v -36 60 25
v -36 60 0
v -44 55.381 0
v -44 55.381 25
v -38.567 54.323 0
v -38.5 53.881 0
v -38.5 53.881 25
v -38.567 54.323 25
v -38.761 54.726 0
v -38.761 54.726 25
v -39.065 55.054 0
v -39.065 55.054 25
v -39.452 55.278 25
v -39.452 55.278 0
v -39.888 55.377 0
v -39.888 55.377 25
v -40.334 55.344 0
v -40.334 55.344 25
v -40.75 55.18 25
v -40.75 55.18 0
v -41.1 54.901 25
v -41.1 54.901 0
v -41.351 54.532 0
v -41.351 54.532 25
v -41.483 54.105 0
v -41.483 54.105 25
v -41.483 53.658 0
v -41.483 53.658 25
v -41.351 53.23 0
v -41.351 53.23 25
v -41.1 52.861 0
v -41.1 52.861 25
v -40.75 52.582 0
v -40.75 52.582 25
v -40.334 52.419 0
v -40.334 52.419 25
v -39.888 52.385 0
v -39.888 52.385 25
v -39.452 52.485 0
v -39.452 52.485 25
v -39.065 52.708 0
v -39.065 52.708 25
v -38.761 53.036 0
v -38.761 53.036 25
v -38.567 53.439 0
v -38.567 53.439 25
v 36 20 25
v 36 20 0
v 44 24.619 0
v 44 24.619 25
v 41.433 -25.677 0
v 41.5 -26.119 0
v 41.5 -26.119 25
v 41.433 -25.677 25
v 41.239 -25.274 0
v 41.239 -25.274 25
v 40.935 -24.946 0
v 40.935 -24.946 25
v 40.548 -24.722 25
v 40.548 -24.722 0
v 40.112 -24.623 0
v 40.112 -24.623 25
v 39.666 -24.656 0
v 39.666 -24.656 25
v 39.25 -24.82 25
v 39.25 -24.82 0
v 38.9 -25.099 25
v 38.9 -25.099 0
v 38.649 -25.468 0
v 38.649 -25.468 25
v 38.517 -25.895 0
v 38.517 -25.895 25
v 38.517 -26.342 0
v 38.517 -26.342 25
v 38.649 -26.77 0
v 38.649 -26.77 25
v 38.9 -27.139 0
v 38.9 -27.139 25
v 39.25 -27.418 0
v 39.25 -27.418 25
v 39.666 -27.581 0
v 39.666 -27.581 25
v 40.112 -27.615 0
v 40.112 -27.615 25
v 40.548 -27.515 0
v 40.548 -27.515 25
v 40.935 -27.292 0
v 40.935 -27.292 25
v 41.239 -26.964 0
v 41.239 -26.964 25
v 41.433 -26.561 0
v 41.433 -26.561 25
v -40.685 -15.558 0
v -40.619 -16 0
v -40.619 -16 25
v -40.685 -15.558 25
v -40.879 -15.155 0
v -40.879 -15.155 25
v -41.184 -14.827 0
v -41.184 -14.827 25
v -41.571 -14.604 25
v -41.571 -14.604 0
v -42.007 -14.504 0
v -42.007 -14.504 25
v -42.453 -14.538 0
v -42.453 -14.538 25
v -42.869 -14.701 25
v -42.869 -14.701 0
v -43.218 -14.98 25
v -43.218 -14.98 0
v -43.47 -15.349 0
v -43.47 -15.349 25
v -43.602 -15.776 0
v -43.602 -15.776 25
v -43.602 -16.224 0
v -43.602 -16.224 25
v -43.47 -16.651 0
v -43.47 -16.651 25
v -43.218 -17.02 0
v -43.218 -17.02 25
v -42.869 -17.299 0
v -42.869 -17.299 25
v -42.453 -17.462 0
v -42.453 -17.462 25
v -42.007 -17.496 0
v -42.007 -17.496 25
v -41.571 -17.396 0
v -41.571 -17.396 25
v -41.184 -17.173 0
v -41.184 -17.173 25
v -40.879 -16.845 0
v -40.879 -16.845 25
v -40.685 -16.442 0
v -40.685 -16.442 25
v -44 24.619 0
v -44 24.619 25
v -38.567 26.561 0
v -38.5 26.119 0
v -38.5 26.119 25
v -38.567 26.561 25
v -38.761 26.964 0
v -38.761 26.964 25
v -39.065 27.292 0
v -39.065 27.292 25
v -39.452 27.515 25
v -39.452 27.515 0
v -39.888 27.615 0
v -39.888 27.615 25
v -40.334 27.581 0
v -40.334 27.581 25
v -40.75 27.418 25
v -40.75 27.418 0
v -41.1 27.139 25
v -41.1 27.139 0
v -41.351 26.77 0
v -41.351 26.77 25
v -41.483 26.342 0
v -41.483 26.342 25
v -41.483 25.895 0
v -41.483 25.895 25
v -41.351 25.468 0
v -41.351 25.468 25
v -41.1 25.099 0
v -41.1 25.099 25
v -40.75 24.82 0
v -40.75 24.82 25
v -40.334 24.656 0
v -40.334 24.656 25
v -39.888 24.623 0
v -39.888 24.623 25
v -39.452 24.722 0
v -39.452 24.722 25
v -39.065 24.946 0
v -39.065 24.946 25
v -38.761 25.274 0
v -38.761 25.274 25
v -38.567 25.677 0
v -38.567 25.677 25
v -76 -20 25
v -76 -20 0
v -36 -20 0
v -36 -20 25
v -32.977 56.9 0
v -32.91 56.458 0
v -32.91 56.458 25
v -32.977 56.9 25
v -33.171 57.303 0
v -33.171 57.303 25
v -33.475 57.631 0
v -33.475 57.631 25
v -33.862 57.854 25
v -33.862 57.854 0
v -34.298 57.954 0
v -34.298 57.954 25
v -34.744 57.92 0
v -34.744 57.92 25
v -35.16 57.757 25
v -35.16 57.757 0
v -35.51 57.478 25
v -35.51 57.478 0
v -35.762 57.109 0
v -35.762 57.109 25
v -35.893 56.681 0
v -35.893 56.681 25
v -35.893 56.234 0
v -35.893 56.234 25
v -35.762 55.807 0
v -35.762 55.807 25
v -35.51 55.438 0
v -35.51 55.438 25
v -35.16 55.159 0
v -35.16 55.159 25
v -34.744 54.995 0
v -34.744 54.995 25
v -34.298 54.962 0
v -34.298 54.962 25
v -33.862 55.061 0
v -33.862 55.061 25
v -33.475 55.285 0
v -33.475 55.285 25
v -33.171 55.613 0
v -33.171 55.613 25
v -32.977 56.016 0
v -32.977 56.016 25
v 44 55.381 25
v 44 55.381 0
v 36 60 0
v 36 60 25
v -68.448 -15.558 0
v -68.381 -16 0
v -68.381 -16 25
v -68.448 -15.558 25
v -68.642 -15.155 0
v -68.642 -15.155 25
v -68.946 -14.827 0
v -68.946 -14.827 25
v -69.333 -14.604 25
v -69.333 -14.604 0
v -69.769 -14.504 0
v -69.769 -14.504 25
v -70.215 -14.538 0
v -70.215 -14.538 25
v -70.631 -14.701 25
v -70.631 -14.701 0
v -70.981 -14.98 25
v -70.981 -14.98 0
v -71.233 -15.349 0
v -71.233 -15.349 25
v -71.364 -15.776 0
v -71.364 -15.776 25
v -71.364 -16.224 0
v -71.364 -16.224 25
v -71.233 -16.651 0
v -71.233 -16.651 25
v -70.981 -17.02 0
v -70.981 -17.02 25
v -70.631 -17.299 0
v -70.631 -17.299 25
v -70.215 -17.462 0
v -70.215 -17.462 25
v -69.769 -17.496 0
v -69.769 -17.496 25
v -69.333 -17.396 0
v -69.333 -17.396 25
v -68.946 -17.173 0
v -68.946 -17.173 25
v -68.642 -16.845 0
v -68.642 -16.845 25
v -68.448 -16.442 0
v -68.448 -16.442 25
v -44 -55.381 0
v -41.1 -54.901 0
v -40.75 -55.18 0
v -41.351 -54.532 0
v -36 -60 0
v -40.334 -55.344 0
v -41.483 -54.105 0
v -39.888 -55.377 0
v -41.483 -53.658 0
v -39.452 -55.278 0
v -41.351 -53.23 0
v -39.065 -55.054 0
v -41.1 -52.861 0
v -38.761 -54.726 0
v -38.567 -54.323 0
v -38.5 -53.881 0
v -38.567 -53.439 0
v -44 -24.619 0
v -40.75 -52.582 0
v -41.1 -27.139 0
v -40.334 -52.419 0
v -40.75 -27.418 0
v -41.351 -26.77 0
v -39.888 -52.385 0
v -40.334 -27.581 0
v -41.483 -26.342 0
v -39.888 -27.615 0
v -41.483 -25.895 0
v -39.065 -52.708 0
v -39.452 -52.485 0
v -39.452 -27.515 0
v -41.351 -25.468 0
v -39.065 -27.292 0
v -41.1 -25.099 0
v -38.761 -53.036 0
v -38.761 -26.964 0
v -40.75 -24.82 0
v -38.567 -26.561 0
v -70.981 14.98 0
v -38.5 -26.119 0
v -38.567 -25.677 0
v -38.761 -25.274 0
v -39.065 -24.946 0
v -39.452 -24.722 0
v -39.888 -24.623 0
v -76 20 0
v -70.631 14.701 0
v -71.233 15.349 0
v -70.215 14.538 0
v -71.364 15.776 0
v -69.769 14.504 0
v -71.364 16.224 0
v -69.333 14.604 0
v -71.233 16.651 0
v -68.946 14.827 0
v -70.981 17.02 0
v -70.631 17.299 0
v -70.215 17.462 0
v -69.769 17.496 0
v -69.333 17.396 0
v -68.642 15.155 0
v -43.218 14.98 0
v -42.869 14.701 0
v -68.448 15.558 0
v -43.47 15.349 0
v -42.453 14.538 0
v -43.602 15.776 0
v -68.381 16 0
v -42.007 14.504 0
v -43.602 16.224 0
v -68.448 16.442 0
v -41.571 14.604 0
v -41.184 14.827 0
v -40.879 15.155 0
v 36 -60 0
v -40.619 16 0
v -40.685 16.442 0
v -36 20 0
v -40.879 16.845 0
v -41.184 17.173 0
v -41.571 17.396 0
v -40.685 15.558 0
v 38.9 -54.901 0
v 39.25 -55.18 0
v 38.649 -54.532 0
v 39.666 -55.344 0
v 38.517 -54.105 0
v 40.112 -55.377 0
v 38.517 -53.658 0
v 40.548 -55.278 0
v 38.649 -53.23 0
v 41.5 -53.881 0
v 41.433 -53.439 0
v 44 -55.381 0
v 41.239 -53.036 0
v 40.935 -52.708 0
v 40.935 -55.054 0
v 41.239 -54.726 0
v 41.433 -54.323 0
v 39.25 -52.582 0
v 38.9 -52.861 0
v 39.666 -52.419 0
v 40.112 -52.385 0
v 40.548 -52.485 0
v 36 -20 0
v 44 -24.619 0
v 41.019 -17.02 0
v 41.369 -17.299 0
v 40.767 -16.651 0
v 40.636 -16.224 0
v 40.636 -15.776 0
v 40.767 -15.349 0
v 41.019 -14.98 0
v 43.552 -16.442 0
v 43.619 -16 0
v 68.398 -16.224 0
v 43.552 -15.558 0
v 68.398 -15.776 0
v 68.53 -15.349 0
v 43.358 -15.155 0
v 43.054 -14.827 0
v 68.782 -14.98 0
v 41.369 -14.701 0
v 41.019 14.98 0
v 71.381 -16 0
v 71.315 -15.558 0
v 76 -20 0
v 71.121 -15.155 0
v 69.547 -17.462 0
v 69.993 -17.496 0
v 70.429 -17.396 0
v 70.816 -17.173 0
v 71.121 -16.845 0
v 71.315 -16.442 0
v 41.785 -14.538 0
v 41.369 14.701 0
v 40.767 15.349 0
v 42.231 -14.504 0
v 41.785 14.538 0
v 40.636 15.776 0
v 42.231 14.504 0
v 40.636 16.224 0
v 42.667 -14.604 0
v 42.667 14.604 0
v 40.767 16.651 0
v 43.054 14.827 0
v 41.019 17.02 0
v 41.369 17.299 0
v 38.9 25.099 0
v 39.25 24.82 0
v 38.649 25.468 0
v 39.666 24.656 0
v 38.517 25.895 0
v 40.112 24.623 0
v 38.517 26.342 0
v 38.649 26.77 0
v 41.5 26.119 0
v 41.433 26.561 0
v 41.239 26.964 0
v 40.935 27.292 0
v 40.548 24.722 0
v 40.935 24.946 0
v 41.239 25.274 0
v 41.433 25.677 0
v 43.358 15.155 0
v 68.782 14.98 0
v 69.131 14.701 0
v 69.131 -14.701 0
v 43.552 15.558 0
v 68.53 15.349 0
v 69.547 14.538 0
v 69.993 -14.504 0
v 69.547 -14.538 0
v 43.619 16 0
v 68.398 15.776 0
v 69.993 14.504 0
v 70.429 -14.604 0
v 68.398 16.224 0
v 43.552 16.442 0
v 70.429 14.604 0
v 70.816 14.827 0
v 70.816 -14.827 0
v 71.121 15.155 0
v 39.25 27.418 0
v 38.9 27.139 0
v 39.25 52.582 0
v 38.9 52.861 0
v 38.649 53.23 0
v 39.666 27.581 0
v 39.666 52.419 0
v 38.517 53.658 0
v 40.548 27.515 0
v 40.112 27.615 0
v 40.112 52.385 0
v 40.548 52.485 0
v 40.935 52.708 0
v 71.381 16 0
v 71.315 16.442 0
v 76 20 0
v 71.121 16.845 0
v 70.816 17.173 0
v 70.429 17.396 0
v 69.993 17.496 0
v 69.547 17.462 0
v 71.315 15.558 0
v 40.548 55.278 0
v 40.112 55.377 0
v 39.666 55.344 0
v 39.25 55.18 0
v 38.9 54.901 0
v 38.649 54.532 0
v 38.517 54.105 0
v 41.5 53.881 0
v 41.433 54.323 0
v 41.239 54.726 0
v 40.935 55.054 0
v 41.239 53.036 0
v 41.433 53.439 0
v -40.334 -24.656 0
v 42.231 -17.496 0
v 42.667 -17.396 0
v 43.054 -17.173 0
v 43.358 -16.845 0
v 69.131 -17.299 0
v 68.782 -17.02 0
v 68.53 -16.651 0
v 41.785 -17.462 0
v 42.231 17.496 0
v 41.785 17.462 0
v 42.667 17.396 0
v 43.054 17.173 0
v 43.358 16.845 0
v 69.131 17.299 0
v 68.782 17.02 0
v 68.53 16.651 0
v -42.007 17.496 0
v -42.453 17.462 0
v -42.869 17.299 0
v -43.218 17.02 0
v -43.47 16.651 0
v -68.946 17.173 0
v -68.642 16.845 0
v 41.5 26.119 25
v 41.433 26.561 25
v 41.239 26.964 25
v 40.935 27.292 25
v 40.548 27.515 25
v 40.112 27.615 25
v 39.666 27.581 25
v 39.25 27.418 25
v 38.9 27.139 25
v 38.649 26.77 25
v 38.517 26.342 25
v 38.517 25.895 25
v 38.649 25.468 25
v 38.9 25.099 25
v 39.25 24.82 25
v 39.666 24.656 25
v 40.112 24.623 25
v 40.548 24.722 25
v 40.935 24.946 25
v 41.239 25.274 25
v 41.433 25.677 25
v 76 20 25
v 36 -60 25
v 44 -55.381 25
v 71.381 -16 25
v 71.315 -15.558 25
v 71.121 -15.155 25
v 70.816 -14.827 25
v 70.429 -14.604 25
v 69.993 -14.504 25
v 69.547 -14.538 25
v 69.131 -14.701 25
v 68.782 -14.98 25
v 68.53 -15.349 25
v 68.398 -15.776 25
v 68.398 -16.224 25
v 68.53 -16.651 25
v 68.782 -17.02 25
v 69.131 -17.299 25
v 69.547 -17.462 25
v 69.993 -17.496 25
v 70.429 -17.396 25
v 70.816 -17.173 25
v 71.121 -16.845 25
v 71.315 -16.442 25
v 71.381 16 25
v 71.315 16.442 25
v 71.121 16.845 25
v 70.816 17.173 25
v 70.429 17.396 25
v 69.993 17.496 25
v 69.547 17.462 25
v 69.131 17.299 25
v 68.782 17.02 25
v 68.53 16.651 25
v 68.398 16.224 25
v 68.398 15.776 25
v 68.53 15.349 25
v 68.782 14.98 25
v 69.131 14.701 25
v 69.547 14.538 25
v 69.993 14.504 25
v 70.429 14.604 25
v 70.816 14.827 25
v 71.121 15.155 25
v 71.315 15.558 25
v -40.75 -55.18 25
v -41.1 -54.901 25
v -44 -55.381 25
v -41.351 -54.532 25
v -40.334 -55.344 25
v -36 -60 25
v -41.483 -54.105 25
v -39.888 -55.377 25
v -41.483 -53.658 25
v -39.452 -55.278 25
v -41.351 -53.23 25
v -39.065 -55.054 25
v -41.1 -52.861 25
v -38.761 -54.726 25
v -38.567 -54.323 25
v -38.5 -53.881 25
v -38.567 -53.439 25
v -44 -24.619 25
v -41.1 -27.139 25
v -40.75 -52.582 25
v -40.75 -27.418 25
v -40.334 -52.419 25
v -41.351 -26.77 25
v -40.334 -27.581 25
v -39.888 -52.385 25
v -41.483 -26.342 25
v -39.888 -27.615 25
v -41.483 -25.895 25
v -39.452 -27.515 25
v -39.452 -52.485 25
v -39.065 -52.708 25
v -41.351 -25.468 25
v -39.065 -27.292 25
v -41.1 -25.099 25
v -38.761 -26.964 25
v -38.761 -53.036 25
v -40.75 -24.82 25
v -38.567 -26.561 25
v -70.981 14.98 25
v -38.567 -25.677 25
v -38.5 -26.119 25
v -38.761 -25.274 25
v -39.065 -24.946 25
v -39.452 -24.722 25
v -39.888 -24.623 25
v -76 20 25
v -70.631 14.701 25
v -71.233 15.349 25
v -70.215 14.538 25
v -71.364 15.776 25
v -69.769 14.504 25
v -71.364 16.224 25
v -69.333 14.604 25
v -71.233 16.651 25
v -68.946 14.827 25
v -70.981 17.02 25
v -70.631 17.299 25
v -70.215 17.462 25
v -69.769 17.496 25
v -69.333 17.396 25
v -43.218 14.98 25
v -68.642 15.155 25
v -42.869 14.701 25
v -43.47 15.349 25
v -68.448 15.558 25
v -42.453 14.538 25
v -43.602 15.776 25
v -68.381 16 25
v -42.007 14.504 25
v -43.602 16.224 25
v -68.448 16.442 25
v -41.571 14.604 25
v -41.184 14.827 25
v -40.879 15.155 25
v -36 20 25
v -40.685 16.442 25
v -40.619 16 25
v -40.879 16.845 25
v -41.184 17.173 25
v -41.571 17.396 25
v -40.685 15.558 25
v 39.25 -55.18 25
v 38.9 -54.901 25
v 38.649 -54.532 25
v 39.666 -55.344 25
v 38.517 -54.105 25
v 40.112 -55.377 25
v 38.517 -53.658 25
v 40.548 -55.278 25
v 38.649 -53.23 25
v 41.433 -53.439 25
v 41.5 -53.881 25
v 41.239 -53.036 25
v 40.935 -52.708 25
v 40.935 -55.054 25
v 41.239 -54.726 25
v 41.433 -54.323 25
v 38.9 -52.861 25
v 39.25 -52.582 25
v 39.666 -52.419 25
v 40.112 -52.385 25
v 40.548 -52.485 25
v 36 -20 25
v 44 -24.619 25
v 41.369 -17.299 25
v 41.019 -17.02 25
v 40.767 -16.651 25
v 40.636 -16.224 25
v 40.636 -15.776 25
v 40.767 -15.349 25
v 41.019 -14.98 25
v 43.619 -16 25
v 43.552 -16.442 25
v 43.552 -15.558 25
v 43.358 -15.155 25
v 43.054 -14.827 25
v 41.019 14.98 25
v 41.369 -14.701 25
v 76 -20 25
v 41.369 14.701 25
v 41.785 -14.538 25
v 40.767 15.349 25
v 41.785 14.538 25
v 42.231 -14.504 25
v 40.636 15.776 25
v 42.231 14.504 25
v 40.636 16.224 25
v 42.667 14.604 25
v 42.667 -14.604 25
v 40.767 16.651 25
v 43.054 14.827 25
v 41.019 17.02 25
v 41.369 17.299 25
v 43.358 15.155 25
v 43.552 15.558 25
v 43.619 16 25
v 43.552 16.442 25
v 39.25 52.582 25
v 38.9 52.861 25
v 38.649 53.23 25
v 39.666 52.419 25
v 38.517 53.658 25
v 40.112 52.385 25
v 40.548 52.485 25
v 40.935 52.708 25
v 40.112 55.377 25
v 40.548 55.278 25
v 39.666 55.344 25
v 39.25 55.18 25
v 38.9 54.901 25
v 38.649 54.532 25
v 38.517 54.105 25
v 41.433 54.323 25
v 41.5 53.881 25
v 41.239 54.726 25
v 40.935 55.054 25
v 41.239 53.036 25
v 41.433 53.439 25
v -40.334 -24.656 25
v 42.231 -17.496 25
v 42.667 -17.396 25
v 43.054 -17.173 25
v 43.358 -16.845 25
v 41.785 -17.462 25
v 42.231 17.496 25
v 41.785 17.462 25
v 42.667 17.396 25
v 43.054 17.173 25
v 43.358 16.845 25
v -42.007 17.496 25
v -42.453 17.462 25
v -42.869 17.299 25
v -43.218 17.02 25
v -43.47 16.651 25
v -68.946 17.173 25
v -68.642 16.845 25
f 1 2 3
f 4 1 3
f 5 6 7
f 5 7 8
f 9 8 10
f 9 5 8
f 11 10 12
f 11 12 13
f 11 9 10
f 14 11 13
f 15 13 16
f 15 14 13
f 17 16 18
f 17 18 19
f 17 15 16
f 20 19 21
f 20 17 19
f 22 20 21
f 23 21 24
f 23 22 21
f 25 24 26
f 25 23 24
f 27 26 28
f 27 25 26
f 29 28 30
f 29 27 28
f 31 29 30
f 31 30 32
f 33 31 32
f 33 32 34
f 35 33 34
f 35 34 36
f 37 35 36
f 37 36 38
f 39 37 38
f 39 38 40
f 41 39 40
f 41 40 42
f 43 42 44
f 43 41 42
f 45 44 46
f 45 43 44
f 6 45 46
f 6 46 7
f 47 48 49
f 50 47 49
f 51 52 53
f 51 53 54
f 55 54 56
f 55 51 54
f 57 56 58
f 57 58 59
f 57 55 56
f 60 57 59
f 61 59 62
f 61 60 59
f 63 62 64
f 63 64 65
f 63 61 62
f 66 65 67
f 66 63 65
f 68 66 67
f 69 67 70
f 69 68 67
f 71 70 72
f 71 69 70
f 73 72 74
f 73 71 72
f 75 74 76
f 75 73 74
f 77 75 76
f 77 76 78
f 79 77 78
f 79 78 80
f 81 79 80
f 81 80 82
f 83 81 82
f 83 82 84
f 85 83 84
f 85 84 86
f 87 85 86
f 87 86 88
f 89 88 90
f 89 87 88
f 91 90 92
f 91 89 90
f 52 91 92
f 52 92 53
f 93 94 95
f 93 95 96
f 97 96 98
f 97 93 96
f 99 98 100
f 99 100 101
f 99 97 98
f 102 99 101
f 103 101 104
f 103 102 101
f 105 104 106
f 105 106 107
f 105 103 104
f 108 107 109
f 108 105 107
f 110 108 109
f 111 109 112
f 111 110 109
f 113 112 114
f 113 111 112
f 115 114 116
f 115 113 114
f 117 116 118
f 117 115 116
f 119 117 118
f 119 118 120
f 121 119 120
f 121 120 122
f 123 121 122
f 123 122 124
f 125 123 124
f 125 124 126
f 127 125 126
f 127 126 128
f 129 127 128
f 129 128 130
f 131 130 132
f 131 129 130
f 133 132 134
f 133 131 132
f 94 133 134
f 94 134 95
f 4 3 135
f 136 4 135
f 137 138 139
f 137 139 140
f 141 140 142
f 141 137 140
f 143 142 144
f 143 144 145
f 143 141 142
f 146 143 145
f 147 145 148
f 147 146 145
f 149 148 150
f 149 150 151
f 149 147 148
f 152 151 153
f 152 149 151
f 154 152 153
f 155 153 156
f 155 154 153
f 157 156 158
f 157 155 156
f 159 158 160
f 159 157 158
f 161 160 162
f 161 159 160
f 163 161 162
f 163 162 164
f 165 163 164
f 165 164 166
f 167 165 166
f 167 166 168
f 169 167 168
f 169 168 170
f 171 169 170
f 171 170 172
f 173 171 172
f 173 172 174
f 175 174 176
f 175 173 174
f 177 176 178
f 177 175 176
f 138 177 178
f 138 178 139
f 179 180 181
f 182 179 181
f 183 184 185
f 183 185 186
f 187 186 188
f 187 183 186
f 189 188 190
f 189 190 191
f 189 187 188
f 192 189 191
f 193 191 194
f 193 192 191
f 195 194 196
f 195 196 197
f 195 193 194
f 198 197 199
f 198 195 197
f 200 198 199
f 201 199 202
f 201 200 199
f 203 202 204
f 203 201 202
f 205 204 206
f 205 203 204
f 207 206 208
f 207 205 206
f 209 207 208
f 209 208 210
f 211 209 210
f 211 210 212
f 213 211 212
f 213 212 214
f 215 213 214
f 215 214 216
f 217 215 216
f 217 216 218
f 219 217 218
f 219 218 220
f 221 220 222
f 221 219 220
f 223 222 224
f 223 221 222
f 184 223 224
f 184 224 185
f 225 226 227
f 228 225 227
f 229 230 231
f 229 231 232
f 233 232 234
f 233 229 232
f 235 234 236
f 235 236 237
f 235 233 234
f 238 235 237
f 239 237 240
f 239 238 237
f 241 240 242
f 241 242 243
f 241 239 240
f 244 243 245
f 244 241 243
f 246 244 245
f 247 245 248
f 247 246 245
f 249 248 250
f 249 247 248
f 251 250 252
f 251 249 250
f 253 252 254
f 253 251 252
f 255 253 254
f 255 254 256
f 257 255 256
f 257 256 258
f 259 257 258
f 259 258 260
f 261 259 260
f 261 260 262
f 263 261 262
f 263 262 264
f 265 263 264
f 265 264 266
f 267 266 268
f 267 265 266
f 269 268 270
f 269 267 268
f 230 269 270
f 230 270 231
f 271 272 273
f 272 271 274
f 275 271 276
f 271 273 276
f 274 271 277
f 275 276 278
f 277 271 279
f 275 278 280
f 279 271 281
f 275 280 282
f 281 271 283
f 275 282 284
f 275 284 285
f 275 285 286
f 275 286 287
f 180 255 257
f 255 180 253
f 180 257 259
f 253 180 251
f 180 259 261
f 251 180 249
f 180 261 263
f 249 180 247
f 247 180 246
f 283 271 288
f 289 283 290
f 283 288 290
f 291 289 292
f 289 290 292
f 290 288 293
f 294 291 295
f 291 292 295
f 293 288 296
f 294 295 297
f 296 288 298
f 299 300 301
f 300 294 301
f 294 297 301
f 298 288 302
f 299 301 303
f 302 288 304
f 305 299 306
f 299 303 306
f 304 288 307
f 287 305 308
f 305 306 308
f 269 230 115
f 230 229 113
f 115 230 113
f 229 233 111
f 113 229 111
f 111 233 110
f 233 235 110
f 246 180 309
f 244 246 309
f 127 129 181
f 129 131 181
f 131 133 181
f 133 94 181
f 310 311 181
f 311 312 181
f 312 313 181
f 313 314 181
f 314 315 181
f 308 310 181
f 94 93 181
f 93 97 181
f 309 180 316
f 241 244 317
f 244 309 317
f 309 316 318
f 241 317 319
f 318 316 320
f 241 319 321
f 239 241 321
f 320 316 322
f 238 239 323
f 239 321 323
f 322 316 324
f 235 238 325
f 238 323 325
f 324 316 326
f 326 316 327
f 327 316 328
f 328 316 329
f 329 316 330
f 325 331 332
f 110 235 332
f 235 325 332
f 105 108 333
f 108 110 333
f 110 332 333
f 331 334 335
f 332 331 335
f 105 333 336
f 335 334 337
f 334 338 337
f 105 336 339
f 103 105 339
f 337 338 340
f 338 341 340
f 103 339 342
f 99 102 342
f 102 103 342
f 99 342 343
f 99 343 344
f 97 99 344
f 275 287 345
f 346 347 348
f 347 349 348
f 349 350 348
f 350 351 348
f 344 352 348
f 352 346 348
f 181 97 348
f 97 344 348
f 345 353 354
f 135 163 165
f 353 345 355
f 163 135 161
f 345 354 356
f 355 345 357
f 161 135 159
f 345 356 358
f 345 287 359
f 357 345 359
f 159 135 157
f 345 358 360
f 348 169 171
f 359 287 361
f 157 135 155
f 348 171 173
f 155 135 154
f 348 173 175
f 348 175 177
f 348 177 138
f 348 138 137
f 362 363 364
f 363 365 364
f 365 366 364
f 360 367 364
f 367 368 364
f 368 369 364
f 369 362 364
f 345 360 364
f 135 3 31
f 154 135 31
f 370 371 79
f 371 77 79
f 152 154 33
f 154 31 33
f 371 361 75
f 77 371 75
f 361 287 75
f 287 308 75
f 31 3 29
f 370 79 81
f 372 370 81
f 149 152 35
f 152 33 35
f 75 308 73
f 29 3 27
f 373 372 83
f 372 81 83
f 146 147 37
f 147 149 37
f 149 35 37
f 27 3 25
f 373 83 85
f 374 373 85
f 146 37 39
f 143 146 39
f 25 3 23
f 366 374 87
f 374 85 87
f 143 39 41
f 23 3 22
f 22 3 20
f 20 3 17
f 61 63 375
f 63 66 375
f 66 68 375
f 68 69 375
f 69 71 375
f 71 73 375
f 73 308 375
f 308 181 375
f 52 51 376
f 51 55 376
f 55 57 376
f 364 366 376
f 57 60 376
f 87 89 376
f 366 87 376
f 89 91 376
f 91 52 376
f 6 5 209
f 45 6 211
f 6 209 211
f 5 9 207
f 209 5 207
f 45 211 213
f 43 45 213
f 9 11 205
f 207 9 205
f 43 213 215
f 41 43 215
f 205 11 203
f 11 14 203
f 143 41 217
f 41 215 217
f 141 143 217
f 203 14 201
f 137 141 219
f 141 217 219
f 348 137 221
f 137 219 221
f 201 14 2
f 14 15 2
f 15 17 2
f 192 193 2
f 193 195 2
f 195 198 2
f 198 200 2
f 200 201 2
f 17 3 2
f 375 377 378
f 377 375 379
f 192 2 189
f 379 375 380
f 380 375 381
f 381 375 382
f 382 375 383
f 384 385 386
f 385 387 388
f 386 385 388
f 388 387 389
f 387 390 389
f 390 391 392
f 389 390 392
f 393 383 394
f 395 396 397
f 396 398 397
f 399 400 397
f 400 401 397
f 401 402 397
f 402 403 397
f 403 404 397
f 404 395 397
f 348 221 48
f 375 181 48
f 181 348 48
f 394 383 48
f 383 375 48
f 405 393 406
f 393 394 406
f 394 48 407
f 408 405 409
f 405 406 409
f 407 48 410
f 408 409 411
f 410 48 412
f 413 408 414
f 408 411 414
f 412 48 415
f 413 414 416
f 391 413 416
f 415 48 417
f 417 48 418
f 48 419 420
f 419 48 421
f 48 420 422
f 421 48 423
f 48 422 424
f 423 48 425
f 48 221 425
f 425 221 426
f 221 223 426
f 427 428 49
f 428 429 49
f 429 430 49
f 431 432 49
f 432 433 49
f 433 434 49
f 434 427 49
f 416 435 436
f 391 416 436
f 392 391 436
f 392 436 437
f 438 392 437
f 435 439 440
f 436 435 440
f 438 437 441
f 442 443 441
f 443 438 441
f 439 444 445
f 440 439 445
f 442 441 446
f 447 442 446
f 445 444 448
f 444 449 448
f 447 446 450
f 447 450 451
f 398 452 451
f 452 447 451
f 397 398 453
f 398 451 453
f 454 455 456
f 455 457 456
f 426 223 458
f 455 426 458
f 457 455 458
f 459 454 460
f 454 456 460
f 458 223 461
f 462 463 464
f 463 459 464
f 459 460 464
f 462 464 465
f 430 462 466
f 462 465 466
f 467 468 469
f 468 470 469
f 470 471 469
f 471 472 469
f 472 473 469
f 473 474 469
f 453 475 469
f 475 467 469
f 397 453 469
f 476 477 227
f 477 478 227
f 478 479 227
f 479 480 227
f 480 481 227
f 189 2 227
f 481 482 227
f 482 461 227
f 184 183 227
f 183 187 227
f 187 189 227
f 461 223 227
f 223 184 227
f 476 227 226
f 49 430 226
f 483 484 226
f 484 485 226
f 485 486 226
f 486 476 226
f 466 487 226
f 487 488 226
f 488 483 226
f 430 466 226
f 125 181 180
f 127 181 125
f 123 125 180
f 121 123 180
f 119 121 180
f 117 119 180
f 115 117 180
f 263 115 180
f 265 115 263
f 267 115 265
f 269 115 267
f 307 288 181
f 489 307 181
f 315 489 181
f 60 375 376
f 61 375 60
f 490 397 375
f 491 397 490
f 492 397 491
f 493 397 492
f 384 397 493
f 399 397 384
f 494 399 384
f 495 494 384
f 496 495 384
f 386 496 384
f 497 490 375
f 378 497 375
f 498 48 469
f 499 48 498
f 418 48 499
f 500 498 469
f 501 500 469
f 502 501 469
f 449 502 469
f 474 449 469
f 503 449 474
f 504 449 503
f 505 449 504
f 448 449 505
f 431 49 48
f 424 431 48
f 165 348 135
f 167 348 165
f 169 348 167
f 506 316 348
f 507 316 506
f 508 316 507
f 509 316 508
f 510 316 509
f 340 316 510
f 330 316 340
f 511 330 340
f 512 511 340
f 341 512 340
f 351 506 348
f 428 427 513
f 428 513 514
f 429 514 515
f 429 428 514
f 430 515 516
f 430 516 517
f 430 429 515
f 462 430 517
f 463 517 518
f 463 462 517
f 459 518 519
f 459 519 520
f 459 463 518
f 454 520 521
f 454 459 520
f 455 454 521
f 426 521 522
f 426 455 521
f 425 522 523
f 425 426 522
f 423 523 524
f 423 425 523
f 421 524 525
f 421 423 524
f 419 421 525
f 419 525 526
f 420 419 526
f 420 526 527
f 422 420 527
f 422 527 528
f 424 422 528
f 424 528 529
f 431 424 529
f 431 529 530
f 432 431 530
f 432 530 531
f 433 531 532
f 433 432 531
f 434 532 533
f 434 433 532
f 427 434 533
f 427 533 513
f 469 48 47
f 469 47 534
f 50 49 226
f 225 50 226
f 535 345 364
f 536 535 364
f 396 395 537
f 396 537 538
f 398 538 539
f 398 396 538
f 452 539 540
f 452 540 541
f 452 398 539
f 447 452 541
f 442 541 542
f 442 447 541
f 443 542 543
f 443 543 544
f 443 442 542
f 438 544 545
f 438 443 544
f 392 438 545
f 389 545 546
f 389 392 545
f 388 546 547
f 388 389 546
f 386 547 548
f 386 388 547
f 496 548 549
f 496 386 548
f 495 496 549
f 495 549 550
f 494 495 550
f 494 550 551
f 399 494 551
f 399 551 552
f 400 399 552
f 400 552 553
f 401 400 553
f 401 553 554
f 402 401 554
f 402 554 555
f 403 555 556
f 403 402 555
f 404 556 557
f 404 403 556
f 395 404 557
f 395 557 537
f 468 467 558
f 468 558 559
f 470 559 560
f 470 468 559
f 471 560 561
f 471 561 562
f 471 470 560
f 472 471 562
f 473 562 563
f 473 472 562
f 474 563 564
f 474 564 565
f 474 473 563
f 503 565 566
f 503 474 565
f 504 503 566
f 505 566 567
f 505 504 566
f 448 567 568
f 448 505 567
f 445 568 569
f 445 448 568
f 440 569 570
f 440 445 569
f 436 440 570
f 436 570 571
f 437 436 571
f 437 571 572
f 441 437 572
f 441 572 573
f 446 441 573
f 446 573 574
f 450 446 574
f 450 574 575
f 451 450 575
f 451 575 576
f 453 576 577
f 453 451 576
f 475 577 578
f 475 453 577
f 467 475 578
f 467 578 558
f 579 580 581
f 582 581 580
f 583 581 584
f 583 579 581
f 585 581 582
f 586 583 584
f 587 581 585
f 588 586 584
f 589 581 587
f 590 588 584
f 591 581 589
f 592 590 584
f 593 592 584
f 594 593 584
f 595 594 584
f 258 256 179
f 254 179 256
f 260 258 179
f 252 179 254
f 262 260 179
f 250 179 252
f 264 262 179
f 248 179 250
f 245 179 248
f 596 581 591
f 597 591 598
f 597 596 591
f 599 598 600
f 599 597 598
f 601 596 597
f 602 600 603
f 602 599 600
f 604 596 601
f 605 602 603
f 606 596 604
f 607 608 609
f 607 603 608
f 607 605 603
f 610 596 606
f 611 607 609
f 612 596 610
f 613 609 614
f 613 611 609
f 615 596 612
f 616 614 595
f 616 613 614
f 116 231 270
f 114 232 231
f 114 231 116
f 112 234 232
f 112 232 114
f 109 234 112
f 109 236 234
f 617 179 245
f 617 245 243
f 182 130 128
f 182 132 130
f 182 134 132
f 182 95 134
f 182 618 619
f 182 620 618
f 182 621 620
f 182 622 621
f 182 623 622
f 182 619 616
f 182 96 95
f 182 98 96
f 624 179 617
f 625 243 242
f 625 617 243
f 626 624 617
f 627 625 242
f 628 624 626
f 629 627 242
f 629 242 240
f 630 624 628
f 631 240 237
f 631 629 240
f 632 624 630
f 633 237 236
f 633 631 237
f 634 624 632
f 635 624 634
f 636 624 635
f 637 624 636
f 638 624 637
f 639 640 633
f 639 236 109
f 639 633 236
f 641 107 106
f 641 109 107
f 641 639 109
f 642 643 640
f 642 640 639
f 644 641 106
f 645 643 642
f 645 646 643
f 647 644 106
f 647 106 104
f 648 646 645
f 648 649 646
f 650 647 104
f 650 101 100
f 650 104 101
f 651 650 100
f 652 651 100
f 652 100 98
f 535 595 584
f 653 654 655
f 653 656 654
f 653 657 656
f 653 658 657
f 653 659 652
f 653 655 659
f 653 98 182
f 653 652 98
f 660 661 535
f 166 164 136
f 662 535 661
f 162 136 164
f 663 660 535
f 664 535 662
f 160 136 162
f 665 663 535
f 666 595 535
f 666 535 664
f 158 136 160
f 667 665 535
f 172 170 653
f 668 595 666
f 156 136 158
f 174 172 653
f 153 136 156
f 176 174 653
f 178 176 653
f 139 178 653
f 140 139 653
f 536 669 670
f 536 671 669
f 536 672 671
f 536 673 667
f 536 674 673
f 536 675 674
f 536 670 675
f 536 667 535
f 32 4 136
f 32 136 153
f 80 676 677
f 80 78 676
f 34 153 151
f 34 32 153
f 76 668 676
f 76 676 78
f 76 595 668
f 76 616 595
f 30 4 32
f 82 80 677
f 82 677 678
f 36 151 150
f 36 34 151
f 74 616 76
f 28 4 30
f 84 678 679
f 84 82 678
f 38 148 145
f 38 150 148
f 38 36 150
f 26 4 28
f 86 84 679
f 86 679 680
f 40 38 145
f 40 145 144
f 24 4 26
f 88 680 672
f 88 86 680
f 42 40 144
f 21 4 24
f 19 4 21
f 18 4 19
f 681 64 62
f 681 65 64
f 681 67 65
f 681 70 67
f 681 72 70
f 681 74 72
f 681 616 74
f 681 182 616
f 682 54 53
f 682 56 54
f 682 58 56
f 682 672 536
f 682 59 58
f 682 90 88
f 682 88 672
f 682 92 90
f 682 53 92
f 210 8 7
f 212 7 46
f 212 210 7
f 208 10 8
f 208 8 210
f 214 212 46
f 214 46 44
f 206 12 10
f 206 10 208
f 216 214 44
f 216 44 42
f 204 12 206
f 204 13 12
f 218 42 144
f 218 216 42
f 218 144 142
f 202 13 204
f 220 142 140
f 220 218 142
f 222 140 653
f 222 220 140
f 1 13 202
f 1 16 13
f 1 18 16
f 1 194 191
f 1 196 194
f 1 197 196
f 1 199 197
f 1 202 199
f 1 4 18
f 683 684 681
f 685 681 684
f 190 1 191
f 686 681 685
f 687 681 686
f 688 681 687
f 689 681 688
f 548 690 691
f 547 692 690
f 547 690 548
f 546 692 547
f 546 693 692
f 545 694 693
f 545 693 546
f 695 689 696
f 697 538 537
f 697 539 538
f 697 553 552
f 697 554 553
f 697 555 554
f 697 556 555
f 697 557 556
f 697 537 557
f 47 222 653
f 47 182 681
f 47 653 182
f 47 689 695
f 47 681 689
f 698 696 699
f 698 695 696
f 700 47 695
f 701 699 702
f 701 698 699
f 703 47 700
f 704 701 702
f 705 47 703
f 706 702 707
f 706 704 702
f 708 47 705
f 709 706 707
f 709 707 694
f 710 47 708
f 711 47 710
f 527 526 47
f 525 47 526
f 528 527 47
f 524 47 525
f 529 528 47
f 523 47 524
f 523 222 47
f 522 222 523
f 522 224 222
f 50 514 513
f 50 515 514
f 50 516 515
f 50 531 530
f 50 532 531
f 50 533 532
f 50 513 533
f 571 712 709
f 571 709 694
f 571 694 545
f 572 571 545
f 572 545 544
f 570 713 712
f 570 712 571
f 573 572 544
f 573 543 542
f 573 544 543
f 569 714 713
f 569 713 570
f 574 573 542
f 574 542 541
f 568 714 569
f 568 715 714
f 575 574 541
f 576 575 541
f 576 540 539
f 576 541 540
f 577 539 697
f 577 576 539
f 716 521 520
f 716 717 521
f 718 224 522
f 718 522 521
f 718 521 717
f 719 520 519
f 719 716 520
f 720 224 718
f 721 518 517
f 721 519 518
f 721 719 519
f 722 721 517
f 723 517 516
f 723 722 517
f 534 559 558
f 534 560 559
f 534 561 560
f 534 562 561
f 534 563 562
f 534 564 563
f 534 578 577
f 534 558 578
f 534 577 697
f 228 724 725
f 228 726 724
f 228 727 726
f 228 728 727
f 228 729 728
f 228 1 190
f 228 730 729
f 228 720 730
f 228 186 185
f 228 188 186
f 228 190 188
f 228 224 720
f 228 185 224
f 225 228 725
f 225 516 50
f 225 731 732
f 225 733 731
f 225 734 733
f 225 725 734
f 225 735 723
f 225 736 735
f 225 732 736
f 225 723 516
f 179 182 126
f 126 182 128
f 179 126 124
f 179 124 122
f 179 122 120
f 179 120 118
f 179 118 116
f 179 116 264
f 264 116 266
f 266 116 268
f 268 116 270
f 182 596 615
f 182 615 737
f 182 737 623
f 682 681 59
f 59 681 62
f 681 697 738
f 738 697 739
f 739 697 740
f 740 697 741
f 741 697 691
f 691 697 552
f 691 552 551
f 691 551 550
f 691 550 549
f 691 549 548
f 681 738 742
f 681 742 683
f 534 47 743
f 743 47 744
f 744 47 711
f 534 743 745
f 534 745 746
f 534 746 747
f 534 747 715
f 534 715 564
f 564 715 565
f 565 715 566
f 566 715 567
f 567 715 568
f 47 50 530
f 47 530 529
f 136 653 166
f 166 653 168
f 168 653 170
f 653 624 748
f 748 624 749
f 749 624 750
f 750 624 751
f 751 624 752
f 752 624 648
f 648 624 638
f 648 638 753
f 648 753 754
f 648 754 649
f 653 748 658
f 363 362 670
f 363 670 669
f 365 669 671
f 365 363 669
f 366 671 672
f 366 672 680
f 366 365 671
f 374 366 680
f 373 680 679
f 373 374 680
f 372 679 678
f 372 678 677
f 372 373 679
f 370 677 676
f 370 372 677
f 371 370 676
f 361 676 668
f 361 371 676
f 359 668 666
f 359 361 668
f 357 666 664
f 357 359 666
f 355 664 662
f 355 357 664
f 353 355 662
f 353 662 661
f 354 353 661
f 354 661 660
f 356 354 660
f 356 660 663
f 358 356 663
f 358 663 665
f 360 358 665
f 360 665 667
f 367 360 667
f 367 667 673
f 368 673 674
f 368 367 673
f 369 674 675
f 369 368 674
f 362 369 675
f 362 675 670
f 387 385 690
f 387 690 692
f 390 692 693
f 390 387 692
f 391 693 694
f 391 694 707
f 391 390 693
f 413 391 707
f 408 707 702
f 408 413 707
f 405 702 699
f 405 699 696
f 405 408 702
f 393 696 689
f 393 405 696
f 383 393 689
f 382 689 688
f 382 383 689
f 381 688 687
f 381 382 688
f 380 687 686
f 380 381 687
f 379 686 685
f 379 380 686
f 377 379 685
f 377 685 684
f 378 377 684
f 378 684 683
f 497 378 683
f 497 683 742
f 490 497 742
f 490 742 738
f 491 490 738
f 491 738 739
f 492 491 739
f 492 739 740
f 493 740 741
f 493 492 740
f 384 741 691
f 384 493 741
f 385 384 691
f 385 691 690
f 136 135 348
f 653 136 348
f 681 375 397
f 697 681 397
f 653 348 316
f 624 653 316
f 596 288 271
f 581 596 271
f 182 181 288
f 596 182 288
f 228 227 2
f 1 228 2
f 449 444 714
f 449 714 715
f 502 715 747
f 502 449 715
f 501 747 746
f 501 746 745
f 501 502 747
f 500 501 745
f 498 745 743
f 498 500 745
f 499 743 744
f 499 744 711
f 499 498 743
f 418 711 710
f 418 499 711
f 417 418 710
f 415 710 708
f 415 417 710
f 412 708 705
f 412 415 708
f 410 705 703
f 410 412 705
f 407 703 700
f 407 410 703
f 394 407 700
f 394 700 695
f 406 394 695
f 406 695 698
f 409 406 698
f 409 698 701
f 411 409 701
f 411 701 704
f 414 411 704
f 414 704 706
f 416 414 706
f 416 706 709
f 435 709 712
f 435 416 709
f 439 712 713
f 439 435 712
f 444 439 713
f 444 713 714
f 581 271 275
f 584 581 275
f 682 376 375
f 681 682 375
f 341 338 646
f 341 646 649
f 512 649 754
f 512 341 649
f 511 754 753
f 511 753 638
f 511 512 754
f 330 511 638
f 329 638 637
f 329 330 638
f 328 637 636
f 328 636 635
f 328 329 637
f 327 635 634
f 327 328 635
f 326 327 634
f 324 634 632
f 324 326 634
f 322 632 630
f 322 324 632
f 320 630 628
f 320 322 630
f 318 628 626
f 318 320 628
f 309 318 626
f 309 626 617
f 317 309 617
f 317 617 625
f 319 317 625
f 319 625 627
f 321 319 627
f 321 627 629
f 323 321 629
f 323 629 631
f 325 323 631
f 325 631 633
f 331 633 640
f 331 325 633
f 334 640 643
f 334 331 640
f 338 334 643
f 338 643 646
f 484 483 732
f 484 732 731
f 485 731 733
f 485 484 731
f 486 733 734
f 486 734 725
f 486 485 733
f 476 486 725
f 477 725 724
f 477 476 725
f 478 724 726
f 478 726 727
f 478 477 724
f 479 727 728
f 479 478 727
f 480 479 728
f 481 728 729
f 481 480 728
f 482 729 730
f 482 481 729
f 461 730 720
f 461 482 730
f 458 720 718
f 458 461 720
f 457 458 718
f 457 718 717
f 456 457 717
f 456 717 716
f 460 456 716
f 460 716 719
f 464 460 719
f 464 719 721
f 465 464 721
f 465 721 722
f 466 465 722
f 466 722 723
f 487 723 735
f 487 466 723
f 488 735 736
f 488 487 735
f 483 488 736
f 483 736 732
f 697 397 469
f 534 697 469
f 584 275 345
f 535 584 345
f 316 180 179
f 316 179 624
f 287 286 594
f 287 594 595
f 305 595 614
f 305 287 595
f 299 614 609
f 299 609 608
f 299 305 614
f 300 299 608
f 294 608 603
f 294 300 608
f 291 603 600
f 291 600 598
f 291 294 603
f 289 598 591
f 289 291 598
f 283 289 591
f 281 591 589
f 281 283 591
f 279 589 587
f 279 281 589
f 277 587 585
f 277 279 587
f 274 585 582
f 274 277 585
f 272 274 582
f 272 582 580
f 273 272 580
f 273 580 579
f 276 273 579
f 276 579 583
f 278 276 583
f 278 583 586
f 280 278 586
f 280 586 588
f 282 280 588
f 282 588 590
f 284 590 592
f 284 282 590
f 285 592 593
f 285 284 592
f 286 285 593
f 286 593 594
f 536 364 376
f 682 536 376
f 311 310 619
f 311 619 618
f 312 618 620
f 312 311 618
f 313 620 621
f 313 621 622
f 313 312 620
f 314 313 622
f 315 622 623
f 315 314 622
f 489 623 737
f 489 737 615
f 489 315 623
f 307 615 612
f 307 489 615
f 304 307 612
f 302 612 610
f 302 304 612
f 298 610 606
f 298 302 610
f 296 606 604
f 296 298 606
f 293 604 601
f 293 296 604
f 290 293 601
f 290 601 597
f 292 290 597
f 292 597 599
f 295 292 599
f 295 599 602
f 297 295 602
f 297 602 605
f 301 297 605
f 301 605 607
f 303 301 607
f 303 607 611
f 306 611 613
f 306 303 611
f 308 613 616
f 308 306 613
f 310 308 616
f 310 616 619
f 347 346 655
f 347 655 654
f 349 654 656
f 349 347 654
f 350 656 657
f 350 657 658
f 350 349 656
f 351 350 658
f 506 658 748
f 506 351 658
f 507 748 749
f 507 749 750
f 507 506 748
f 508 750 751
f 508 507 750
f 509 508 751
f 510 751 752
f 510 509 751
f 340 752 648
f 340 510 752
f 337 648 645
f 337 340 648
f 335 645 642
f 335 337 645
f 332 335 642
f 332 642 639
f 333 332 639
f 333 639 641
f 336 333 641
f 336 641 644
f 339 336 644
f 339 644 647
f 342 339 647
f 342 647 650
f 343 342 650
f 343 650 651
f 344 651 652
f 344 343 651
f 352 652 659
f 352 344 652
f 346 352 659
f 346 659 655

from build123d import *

# Parameters (mm, degrees)
F0_W     = 40
F0_H     = 40
F0_R     = 1.5
F1_DEPTH = 25


with BuildPart() as f1:
    # F0 (on Top) → F1 (new body)
    with BuildSketch(Plane.XY):
        with Locations((-56, 0)):
            Rectangle(F0_W, F0_H)
        with Locations((-69.8812, -16)):
            Circle(F0_R, mode=Mode.SUBTRACT)
        with Locations((-42.1188, -16)):
            Circle(F0_R, mode=Mode.SUBTRACT)
        with Locations((-69.8812, 16)):
            Circle(F0_R, mode=Mode.SUBTRACT)
        with Locations((-42.1188, 16)):
            Circle(F0_R, mode=Mode.SUBTRACT)
        Polygon((0, 20), (-36, 20), (-36, -20), (0, -20), (36, -20), (36, 20), align=None)
        Polygon((0, -20), (-36, -20), (-36, -60), (0, -60), (36, -60), (36, -20), align=None)
        Polygon((-36, -60), (-36, -20), (-44, -24.618802), (-44, -55.381198), align=None)
        with Locations((-40, -53.881198)):
            Circle(F0_R, mode=Mode.SUBTRACT)
        with Locations((-40, -26.118802)):
            Circle(F0_R, mode=Mode.SUBTRACT)
        Polygon((44, -24.618802), (36, -20), (36, -60), (44, -55.381198), align=None)
        with Locations((40, -53.881198)):
            Circle(F0_R, mode=Mode.SUBTRACT)
        with Locations((40, -26.118802)):
            Circle(F0_R, mode=Mode.SUBTRACT)
        Polygon((-36, 60), (-36, 20), (0, 20), (36, 20), (36, 60), (0, 60), align=None)
        with Locations((-34.410123, 56.457806)):
            Circle(F0_R, mode=Mode.SUBTRACT)
        Polygon((-44, 24.618802), (-36, 20), (-36, 60), (-44, 55.381198), align=None)
        with Locations((-40, 26.118802)):
            Circle(F0_R, mode=Mode.SUBTRACT)
        with Locations((-40, 53.881198)):
            Circle(F0_R, mode=Mode.SUBTRACT)
        with Locations((56, 0)):
            Rectangle(F0_W, F0_H)
        with Locations((42.1188, -16)):
            Circle(F0_R, mode=Mode.SUBTRACT)
        with Locations((69.8812, -16)):
            Circle(F0_R, mode=Mode.SUBTRACT)
        with Locations((42.1188, 16)):
            Circle(F0_R, mode=Mode.SUBTRACT)
        with Locations((69.8812, 16)):
            Circle(F0_R, mode=Mode.SUBTRACT)
        Polygon((36, 60), (36, 20), (44, 24.618802), (44, 55.381198), align=None)
        with Locations((40, 26.118802)):
            Circle(F0_R, mode=Mode.SUBTRACT)
        with Locations((40, 53.881198)):
            Circle(F0_R, mode=Mode.SUBTRACT)
    extrude(amount=F1_DEPTH)


solid = f1.part
